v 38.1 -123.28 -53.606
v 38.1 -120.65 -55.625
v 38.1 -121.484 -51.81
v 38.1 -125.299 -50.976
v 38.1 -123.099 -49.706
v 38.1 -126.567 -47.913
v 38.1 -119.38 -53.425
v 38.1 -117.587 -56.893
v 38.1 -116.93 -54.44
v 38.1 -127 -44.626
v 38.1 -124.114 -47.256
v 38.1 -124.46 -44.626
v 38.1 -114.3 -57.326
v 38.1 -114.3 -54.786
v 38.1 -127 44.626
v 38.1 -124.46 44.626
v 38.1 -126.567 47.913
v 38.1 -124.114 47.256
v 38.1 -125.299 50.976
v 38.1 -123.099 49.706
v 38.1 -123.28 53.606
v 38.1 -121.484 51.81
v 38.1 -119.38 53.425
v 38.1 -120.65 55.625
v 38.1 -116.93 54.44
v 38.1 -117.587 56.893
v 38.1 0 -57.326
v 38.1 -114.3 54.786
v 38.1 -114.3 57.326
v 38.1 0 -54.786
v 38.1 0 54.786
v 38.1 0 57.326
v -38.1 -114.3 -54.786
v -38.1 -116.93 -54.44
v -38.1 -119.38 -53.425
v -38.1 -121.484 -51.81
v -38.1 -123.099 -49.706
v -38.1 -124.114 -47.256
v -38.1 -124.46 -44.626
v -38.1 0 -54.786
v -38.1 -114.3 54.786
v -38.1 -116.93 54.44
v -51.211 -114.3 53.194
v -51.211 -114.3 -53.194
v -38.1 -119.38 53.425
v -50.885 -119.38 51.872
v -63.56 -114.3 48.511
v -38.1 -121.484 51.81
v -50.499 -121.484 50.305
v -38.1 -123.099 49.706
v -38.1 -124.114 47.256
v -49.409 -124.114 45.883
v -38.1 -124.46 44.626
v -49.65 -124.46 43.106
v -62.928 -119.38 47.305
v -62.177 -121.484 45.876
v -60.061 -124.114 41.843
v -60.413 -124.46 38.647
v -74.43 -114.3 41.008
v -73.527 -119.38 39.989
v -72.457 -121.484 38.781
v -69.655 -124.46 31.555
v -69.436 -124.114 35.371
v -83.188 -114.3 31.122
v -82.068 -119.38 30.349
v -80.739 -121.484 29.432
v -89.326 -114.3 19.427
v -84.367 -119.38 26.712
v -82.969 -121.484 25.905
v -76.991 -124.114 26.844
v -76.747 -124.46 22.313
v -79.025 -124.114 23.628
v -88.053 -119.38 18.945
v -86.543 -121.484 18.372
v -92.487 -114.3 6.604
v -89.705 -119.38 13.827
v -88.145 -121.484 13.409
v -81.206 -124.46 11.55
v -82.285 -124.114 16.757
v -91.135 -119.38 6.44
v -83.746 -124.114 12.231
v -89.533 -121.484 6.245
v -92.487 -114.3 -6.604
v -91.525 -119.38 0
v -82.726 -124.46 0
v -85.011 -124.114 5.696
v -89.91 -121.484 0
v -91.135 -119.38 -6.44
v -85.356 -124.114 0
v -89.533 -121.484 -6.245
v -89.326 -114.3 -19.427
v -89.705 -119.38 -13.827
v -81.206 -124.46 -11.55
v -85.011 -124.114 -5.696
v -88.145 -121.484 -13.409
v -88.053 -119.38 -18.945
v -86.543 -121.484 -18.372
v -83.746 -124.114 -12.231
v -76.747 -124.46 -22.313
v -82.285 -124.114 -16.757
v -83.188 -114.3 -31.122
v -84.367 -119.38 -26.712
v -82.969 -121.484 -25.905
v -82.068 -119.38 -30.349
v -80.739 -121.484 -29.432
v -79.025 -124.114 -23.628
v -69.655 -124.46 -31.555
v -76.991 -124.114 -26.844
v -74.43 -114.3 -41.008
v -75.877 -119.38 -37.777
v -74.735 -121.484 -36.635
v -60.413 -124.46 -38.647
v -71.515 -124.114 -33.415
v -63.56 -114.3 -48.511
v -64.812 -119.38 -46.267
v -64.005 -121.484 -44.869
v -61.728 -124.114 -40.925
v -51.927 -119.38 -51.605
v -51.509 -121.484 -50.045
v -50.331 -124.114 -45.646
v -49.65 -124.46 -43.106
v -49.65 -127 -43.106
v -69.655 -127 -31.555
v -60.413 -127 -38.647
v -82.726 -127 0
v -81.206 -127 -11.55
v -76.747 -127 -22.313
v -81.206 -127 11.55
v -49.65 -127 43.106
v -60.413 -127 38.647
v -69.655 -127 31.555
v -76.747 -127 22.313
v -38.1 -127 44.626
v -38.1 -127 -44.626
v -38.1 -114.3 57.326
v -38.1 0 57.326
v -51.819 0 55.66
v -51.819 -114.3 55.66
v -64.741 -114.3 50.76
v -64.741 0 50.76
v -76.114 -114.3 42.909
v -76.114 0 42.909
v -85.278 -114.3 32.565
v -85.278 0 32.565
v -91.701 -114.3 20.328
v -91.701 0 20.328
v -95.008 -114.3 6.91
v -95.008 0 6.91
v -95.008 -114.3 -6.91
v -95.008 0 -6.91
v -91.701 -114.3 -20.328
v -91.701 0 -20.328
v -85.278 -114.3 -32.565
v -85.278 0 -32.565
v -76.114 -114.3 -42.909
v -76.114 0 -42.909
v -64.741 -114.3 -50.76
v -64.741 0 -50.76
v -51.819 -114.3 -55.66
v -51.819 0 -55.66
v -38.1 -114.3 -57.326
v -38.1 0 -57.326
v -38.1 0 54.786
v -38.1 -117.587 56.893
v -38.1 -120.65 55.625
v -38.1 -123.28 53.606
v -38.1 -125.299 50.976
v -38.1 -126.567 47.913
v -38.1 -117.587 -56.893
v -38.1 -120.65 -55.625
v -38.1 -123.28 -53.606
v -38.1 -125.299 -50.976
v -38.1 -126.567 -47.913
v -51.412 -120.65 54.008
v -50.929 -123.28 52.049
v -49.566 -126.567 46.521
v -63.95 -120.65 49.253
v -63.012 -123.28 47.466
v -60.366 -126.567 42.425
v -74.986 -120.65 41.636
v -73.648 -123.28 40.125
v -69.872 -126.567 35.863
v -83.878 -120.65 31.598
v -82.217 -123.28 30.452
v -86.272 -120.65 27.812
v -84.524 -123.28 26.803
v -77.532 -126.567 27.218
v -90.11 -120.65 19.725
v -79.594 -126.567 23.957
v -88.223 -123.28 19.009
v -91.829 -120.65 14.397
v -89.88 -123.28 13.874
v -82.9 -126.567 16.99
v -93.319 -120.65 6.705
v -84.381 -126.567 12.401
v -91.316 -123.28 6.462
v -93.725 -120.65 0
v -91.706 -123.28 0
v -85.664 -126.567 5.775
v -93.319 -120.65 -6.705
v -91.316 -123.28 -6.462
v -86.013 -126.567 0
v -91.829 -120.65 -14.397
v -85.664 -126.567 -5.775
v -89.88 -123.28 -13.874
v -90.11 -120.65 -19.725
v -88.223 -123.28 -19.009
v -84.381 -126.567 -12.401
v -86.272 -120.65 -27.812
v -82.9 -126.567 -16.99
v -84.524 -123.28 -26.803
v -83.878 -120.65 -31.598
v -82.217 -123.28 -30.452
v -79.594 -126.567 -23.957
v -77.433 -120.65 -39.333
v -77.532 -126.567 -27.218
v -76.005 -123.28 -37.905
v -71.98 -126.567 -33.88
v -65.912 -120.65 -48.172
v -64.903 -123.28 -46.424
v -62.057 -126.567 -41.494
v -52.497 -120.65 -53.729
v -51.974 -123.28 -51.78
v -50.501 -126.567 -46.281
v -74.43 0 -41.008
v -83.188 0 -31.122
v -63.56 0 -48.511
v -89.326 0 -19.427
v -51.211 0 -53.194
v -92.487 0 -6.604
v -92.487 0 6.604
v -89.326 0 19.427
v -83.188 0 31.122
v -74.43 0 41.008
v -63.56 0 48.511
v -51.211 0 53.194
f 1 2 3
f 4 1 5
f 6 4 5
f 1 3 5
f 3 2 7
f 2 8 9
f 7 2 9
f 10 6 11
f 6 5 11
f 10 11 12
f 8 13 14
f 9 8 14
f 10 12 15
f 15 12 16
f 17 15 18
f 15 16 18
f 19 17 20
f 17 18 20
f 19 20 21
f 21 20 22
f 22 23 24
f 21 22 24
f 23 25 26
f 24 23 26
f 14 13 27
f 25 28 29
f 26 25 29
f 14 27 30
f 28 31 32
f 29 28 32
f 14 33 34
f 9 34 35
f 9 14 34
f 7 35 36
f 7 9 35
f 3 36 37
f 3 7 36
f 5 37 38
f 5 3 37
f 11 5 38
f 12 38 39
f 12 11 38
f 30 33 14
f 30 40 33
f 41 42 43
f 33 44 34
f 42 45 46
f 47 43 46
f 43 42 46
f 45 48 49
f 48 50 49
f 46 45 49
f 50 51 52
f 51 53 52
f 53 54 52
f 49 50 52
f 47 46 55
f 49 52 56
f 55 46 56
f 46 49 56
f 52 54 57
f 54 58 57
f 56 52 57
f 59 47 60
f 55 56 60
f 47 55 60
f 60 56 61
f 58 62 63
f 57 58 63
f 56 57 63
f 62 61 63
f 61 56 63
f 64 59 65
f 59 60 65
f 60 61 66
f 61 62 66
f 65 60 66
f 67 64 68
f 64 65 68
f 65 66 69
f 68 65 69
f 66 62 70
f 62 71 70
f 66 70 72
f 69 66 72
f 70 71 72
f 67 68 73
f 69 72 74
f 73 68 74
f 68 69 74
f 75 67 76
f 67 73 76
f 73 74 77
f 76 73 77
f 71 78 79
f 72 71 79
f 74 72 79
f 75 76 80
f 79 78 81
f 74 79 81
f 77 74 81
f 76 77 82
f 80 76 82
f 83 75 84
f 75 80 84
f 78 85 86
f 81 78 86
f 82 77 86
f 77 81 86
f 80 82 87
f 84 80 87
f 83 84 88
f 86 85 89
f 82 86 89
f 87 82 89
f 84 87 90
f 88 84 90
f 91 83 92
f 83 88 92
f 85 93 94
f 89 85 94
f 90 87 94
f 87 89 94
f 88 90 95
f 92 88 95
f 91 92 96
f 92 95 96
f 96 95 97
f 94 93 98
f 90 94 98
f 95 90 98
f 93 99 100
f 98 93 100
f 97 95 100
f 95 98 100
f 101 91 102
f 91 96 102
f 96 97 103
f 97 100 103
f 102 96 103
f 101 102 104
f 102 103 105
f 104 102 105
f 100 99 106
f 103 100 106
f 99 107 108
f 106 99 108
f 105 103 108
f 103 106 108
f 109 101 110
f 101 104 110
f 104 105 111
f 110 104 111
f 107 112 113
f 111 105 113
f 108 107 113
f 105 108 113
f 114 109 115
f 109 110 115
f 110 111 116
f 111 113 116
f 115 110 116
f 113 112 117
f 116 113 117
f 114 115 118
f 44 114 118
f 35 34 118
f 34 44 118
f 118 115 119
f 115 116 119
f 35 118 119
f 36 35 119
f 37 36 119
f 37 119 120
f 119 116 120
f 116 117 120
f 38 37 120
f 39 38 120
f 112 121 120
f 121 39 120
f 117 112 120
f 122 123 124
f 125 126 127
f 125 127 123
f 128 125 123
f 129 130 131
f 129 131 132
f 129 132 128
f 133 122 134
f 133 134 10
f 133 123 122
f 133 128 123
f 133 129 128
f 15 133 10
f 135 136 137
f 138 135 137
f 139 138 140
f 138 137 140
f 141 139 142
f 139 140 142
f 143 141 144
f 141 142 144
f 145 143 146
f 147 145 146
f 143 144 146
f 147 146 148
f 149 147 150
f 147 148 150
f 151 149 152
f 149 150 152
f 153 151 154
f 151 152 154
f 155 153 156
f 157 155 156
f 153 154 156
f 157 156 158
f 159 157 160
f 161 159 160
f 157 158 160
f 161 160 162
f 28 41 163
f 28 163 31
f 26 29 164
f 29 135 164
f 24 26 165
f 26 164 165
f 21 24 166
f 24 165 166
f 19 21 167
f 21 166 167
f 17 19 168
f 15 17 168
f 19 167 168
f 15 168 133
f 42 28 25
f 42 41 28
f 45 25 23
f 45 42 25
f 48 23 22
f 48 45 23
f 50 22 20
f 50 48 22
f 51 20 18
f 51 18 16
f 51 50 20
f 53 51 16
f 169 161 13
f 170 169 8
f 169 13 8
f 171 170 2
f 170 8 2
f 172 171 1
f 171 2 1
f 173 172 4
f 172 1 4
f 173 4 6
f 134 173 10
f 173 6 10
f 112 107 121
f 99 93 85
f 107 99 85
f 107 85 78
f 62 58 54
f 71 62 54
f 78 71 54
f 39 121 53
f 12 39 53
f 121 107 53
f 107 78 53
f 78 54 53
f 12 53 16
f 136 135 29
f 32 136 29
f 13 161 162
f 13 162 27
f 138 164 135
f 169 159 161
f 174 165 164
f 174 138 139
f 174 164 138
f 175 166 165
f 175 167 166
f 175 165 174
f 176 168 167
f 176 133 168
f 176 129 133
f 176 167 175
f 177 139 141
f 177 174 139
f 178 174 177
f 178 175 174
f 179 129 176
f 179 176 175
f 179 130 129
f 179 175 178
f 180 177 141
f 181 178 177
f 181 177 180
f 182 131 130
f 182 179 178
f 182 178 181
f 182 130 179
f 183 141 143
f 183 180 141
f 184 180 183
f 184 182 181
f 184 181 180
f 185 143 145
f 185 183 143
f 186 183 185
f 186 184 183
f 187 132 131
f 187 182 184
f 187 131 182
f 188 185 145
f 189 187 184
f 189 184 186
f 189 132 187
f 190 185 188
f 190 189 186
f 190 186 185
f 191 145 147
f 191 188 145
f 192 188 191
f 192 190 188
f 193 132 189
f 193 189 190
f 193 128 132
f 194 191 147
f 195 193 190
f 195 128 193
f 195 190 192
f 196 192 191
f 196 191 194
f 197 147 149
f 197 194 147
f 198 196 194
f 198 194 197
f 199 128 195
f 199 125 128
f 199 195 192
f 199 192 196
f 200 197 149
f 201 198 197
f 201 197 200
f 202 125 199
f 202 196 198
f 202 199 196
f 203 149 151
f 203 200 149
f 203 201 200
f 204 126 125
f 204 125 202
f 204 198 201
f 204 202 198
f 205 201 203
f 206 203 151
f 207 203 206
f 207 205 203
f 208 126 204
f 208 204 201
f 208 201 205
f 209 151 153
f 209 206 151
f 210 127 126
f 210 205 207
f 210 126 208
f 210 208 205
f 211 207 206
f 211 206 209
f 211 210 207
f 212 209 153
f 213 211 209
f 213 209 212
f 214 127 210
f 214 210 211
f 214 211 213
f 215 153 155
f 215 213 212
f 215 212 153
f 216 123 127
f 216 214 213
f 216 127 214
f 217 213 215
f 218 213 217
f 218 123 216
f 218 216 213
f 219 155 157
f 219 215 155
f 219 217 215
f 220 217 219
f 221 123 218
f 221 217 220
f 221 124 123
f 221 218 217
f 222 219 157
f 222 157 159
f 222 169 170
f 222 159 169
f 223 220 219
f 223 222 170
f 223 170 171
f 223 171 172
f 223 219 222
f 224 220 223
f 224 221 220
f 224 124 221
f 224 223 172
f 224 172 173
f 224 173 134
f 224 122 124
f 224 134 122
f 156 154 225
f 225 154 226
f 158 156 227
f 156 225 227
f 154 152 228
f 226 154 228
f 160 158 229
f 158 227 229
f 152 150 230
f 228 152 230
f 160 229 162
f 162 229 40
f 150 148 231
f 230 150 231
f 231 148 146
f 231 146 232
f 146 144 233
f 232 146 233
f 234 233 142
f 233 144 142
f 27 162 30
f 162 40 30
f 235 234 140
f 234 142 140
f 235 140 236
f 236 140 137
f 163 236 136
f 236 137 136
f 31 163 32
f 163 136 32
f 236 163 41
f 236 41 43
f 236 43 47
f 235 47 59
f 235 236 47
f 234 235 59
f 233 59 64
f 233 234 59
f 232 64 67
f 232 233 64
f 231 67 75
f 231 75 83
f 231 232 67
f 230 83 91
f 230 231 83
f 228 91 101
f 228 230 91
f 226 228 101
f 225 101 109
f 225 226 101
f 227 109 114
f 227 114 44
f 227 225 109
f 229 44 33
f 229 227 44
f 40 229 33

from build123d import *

# Parameters (mm, degrees)
F0_W     = 76.2
F0_H     = 114.652204
F2_DEPTH = 127
F3_R     = 12.7
F1_T     = -2.54


with BuildPart() as f2:
    # F0 (on Front) → F2 (new body)
    with BuildSketch(Plane.XZ):
        with BuildLine():
            Line((-38.1, -57.326102), (-38.1, 57.326102))
            ThreePointArc((-38.1, 57.326102), (-95.426102, 0), (-38.1, -57.326102))
        make_face()
        Rectangle(F0_W, F0_H)
    extrude(amount=F2_DEPTH)

    # F3
    f3_edges = [f2.edges().sort_by_distance(p)[0] for p in [
        (-95.426102, -127, 0),
    ]]
    fillet(f3_edges, radius=F3_R)

    # F1
    f1_openings = [f2.faces().sort_by_distance(p)[0] for p in [
        (38.1, -63.210212, 0),
        (-23.187149, 0, 0),
    ]]
    offset(amount=F1_T, openings=f1_openings)


solid = f2.part
